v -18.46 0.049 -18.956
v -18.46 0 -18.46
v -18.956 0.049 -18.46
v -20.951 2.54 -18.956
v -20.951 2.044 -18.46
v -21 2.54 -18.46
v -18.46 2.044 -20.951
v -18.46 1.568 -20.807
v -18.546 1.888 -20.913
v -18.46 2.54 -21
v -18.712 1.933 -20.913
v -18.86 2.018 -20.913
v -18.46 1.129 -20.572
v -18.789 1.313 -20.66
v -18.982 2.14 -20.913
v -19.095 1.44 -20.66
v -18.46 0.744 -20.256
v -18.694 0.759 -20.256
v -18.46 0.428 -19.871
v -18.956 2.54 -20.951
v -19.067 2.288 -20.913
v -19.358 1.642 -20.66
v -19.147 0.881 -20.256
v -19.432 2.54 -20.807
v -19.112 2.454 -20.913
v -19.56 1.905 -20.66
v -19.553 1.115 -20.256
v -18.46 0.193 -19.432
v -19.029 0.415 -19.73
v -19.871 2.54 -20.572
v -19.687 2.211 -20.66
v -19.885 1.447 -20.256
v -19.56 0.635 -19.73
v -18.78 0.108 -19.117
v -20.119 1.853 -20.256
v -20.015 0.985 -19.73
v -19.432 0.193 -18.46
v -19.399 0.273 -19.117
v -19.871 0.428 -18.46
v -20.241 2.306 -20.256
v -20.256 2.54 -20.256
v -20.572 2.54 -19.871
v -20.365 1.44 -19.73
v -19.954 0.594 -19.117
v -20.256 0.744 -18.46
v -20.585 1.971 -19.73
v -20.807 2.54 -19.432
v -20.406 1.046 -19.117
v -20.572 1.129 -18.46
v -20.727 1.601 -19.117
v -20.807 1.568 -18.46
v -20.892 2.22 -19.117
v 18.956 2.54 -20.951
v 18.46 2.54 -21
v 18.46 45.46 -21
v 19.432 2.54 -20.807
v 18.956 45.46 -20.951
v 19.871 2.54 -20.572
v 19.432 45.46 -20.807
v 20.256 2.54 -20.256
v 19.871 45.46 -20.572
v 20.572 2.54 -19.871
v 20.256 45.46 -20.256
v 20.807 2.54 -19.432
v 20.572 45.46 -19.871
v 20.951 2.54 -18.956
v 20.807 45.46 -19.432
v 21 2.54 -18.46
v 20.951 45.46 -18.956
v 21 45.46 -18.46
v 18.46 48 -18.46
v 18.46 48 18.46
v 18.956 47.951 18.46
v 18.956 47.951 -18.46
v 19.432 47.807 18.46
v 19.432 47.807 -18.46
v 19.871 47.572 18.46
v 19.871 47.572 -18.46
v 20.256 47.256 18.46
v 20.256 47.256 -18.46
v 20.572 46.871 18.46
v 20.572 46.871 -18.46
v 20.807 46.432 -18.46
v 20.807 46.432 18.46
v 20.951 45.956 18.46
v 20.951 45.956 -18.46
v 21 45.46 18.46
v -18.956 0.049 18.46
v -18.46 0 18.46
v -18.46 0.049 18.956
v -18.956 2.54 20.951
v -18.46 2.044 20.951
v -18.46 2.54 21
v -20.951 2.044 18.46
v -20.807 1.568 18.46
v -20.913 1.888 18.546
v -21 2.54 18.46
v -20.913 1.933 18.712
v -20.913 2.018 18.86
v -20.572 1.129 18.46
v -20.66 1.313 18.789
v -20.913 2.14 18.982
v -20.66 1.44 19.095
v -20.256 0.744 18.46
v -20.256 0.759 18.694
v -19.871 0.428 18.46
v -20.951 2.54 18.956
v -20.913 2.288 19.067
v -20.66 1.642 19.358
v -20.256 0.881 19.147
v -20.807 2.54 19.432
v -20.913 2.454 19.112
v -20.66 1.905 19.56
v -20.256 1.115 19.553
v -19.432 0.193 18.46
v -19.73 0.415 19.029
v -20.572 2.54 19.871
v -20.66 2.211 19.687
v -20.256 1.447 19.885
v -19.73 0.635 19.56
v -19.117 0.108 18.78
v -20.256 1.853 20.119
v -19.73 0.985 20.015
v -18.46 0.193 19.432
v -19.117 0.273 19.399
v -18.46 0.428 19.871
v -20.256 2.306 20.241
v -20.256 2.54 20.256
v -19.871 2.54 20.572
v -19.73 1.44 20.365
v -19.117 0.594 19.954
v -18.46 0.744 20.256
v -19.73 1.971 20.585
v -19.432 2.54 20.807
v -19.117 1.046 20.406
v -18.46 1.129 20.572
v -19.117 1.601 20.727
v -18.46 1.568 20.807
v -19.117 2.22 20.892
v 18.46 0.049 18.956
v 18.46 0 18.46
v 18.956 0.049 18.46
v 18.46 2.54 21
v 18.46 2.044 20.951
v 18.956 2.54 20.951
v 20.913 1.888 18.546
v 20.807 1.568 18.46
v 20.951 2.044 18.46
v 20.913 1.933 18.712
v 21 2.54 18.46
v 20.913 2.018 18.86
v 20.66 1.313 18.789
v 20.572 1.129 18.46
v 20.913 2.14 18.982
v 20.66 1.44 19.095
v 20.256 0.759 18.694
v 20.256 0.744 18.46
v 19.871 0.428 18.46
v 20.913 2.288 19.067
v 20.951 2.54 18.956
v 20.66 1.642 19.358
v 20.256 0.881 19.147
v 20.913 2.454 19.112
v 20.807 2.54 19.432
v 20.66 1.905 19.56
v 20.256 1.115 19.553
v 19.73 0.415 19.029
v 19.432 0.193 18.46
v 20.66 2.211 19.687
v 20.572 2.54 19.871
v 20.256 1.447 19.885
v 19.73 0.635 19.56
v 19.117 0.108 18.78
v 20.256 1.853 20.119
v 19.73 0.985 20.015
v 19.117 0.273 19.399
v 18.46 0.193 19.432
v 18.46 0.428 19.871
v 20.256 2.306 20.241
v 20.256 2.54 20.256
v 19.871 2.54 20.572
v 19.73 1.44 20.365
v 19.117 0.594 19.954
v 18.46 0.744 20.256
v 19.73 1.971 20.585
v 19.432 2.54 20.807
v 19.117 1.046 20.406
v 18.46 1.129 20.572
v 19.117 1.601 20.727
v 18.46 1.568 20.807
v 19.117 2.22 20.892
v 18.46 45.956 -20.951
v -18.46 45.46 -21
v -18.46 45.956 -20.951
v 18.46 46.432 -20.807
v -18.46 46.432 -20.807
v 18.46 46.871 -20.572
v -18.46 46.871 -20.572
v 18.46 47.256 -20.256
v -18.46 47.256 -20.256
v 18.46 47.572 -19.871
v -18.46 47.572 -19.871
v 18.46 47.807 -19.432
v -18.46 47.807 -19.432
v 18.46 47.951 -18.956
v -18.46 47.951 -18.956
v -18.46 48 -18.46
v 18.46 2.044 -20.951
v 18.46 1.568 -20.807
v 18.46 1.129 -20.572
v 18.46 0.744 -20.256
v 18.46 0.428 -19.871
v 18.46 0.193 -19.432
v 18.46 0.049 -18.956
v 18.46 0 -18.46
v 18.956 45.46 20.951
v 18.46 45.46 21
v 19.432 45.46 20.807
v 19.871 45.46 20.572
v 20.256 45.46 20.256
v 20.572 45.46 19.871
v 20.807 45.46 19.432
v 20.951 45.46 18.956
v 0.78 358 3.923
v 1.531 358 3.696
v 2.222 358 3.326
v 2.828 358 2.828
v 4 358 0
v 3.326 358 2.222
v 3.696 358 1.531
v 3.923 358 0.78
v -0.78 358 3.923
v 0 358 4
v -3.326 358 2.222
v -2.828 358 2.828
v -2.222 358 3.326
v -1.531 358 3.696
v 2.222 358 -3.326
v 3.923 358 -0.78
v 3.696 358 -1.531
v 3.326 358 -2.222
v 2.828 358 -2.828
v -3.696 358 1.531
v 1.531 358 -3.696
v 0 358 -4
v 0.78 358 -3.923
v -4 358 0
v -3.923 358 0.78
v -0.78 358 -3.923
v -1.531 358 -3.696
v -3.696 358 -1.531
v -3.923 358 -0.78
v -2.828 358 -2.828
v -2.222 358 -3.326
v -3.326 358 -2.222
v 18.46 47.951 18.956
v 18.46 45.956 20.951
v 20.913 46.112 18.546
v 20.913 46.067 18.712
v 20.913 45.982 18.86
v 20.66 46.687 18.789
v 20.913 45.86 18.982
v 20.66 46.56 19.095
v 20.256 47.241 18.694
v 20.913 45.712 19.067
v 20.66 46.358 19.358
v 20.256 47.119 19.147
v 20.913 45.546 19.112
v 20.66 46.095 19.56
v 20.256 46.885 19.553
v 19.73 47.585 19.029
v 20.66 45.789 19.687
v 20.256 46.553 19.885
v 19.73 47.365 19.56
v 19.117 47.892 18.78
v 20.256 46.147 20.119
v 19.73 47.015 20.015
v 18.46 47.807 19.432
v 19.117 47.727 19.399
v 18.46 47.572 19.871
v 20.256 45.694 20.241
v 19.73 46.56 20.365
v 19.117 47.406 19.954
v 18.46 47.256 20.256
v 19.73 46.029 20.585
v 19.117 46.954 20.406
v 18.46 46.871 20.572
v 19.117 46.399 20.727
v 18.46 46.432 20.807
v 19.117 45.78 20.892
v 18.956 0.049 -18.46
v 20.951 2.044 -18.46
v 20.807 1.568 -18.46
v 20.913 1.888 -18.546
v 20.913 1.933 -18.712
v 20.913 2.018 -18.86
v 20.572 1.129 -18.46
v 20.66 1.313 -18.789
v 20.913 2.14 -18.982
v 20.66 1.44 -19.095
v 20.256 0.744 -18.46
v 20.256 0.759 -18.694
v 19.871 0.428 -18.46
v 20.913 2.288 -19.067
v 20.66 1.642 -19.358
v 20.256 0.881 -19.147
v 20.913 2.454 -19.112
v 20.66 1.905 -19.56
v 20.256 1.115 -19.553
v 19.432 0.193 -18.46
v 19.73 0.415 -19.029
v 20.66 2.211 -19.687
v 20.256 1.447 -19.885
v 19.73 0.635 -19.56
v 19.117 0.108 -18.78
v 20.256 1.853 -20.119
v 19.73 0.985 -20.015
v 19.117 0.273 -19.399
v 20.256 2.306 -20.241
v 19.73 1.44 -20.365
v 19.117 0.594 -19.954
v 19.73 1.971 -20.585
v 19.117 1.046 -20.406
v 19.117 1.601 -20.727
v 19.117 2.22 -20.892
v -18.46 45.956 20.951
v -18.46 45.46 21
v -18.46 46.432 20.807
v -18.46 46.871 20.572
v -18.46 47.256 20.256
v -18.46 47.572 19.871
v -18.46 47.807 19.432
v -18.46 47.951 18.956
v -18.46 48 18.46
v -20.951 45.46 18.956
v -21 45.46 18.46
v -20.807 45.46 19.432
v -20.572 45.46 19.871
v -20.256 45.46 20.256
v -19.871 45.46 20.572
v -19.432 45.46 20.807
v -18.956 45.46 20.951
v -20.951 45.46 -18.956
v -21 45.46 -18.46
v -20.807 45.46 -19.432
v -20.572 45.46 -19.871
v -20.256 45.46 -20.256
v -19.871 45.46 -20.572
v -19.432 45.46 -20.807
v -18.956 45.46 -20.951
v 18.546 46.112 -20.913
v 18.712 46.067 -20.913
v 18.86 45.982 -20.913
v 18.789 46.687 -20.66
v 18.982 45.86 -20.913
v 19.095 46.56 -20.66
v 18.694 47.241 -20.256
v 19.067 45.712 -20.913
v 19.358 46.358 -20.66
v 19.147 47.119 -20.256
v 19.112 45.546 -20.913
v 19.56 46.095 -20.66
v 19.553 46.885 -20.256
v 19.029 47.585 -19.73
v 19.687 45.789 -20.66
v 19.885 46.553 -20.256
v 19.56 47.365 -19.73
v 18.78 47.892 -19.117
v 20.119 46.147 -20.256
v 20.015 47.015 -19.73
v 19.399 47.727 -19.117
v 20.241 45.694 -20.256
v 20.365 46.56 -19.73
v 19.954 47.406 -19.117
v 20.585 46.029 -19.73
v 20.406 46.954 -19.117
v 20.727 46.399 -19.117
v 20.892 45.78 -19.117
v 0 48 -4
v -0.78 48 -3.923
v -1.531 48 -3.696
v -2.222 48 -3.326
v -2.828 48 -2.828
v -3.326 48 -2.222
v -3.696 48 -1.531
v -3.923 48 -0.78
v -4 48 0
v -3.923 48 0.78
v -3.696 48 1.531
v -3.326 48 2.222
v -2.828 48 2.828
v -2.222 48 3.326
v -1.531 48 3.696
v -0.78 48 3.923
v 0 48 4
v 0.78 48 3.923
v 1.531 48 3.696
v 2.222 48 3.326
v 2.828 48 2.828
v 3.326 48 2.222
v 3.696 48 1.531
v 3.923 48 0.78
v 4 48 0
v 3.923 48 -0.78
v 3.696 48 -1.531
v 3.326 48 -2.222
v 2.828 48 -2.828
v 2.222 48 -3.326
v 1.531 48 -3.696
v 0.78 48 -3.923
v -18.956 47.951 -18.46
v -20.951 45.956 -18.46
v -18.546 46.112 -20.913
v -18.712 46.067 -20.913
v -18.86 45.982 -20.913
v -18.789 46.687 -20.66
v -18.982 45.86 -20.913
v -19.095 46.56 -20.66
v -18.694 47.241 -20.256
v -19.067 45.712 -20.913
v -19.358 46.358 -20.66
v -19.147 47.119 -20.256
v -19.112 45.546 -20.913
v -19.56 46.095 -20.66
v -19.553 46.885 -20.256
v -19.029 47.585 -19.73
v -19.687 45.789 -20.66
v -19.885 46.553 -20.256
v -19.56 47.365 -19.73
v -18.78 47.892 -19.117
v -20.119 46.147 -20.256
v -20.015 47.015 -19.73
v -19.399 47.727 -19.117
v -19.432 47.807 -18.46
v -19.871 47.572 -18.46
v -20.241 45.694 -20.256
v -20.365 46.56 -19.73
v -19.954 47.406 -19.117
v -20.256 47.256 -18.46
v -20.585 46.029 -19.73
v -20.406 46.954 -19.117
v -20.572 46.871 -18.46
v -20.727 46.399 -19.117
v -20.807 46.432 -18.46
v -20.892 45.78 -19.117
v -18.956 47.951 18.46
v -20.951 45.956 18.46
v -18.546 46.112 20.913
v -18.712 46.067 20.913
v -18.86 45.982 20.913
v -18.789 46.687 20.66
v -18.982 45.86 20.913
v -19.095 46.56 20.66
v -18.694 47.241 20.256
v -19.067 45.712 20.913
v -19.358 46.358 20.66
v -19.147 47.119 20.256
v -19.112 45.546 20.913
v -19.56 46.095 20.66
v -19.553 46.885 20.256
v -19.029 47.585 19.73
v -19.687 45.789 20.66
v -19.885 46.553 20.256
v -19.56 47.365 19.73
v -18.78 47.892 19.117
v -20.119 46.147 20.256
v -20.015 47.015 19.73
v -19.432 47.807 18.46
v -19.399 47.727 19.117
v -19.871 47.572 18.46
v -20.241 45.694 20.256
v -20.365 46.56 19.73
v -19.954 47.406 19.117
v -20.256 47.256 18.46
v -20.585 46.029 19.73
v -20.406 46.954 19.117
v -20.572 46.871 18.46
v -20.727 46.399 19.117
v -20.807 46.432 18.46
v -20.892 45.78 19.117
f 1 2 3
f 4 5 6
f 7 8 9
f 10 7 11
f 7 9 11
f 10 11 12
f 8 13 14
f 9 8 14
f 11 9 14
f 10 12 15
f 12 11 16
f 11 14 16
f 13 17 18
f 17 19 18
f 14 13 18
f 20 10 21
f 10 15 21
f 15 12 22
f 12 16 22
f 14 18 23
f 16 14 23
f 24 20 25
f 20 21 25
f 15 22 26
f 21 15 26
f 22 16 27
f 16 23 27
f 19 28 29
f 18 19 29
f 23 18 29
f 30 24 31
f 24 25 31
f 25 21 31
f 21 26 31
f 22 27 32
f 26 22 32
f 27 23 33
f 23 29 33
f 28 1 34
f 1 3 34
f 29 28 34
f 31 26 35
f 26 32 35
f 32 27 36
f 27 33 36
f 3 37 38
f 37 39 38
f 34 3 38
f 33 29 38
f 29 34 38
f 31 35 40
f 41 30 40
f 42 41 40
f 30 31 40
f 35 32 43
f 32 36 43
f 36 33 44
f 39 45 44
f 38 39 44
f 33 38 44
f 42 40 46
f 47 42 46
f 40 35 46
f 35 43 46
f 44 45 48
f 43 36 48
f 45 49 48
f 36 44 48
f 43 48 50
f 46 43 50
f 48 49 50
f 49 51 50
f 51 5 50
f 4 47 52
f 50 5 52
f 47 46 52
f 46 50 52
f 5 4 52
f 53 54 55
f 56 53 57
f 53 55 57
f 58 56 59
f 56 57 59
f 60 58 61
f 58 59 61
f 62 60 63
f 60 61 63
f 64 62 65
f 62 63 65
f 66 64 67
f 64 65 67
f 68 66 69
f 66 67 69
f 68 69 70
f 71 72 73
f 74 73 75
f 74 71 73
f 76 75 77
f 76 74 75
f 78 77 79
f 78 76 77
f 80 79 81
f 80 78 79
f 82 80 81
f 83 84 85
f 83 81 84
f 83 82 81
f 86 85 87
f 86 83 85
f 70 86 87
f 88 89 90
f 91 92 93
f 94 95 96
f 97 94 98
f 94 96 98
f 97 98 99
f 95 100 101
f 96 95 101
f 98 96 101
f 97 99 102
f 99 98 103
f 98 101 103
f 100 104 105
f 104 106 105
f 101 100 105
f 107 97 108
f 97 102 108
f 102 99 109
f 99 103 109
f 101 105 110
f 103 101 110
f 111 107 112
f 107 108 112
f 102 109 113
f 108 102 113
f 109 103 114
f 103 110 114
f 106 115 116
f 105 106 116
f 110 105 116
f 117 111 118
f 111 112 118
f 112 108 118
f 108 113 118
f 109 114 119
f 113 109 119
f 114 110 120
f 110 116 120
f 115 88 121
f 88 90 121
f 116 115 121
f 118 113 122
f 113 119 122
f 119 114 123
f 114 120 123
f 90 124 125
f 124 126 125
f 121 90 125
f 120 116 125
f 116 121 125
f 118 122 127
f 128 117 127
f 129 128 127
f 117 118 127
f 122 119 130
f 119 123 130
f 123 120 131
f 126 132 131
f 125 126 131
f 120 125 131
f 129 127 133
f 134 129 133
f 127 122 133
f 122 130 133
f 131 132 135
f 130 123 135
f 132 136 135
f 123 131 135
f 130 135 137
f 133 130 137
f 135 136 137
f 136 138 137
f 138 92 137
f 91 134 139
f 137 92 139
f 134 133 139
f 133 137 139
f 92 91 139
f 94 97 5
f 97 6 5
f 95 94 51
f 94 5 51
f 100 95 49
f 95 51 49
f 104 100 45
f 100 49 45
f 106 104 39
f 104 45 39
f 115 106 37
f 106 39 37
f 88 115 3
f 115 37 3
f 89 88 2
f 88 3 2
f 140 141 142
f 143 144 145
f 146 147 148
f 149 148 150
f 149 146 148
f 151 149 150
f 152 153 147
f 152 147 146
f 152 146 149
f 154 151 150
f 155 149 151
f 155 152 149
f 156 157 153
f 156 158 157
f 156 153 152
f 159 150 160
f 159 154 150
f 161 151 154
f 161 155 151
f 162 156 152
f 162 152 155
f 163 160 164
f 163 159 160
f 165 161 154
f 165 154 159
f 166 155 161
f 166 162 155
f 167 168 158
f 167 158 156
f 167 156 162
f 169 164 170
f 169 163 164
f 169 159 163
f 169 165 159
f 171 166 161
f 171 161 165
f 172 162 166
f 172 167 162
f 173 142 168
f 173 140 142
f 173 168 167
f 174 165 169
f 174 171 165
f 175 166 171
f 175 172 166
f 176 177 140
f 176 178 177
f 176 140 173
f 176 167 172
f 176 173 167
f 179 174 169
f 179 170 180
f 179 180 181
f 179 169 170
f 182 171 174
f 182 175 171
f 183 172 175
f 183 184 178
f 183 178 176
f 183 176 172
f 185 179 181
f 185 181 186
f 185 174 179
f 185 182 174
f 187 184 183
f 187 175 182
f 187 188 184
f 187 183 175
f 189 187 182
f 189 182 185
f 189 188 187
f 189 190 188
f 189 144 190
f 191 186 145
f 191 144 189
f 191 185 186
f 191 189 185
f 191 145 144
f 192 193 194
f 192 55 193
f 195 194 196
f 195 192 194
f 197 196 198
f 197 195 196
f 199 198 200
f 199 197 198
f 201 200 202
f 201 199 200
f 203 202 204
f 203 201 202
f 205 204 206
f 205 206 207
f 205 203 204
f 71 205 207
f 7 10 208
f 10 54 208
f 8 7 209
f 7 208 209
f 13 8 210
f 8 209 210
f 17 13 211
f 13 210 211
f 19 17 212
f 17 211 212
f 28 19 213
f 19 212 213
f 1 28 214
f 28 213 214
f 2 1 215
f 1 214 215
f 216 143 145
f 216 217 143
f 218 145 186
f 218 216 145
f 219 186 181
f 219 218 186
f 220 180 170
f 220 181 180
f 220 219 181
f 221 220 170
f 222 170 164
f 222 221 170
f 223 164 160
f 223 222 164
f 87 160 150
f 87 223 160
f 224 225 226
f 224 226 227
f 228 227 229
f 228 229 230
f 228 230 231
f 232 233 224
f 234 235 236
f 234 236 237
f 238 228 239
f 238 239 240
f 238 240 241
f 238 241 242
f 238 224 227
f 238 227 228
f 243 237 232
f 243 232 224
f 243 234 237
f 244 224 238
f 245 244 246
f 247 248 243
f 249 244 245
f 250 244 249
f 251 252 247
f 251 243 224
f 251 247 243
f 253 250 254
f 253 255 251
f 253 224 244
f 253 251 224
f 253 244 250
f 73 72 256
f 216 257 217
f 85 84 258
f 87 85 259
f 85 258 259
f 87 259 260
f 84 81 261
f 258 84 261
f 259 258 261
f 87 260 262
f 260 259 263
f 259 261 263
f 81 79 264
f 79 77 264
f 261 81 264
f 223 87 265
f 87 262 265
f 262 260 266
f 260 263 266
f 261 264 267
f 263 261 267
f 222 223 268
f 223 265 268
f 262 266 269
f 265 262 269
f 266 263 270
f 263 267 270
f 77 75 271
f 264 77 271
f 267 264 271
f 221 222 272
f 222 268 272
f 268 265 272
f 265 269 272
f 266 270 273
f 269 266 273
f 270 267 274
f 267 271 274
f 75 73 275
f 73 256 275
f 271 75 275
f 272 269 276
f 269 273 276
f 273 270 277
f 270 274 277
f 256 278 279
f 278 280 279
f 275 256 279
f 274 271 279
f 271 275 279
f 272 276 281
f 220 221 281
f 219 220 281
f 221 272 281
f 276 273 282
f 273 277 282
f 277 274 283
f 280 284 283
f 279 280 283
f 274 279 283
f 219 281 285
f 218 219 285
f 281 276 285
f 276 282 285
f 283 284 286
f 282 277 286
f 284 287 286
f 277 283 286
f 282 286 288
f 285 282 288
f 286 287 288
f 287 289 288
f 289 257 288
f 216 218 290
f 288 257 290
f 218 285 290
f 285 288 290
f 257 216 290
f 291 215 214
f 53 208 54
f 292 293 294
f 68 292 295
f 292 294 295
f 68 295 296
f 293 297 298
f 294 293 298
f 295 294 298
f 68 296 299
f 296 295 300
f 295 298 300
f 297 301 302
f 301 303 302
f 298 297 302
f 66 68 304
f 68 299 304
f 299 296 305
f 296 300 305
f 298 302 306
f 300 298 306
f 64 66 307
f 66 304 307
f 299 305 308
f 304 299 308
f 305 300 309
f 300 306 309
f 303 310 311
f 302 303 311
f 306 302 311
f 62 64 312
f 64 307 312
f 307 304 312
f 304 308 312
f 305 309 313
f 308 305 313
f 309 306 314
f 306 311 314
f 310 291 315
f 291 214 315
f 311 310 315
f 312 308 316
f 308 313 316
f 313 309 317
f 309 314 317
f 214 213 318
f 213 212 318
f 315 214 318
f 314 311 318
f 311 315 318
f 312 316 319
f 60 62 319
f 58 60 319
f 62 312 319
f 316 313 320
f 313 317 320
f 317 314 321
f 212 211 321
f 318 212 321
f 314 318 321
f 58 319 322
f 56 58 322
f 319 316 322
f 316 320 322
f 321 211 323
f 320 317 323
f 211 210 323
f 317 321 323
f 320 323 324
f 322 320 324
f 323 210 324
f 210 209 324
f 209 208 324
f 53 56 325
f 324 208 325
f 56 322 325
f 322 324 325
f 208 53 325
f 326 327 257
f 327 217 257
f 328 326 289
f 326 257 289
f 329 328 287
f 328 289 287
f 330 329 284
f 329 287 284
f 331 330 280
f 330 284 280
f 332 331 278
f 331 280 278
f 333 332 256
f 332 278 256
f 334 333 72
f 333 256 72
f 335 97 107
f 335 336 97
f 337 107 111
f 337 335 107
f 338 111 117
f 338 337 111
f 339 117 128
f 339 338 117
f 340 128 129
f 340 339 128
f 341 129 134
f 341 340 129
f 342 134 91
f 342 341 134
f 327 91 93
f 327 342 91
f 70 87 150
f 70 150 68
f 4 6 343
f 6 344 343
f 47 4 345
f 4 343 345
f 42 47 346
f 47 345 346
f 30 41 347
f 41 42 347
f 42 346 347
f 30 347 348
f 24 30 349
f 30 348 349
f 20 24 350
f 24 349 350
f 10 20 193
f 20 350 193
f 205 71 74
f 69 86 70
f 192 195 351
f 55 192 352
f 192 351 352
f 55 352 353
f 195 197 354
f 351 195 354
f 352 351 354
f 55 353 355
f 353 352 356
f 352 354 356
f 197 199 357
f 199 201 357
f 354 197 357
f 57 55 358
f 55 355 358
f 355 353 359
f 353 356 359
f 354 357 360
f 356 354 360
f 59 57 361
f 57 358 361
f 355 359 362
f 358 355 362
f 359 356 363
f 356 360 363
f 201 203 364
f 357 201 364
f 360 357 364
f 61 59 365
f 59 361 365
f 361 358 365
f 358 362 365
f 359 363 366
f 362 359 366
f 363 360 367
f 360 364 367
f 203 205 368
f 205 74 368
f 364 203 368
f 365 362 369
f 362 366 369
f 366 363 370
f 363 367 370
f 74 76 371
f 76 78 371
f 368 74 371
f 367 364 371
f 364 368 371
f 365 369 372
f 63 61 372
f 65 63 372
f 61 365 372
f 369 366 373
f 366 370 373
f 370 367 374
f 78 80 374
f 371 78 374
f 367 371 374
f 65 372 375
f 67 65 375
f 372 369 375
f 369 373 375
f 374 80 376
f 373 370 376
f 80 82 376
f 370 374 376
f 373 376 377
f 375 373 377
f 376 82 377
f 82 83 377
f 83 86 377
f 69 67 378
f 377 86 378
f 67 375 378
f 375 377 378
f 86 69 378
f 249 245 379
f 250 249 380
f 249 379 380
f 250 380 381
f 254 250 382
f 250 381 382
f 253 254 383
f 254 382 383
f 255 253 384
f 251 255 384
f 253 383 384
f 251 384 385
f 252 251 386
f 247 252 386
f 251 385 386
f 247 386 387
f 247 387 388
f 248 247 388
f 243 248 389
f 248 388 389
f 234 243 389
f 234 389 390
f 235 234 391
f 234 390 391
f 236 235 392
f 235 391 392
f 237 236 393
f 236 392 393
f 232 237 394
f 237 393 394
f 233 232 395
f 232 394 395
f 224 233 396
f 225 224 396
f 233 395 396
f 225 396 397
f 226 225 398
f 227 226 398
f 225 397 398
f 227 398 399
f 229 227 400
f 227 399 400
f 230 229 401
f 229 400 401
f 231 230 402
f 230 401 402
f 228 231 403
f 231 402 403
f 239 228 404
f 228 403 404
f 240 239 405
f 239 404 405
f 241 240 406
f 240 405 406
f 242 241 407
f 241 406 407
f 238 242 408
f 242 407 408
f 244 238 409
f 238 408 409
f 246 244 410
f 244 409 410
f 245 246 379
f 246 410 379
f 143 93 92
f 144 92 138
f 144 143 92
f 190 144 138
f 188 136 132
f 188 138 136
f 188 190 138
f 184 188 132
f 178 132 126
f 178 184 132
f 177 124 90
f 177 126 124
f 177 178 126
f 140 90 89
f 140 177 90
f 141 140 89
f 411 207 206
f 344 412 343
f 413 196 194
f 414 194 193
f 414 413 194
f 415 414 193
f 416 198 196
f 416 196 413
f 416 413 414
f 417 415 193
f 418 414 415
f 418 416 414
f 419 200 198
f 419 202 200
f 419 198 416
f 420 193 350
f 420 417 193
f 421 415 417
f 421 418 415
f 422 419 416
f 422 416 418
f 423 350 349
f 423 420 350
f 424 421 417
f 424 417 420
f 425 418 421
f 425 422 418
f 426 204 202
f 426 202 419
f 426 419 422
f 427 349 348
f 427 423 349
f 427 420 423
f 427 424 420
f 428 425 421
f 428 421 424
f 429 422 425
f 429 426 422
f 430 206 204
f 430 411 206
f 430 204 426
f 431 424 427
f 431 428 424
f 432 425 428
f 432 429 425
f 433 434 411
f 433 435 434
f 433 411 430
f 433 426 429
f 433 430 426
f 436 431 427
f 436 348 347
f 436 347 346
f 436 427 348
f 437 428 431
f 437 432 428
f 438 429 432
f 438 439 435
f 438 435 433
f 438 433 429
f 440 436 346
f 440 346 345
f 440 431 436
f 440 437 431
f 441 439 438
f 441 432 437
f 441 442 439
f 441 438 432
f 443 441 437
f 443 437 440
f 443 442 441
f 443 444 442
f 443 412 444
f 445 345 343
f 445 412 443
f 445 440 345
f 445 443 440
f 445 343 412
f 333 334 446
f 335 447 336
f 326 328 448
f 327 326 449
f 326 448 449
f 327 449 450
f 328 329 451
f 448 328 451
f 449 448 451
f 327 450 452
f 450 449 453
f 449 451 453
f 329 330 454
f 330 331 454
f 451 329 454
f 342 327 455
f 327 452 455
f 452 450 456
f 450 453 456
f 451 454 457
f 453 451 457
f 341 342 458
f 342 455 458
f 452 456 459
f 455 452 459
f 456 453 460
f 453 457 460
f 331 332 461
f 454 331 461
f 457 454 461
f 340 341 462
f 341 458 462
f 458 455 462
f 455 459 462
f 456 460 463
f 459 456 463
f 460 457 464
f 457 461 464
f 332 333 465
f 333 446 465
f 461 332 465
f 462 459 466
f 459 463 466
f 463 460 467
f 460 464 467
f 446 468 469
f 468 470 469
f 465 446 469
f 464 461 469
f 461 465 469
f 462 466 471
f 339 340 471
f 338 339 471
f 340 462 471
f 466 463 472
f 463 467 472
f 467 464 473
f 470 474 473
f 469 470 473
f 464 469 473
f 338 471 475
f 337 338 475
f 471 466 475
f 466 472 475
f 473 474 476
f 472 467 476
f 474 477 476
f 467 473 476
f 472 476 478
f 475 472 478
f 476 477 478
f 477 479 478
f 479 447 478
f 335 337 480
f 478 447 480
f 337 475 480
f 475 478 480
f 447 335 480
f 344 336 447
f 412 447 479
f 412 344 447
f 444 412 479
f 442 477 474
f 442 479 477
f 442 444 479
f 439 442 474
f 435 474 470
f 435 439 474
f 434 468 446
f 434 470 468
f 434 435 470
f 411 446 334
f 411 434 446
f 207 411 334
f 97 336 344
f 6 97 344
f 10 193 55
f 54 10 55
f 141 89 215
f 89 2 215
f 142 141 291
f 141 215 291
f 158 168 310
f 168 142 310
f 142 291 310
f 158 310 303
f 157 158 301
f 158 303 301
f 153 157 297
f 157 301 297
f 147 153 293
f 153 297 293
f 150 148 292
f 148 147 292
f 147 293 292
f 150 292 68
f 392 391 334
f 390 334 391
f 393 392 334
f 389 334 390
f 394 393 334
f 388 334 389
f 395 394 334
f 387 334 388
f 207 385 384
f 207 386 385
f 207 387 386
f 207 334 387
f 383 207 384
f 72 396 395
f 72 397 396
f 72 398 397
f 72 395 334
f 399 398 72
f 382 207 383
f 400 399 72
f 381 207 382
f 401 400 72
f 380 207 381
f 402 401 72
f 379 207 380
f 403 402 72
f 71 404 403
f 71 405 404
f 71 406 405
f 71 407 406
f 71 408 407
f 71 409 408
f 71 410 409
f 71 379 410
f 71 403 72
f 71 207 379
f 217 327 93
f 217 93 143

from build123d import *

# Parameters (mm, degrees)
SKETCH1_W           = 42
SKETCH1_H           = 42
BOSS_EXTRUDE1_DEPTH = 48
SKETCH2_R           = 4
BOSS_EXTRUDE2_DEPTH = 310
FILLET1_R           = 2.54


with BuildPart() as part:
    # Sketch1 → Boss-Extrude1 (new body)
    with BuildSketch(Plane(origin=(0, 0, 0), x_dir=(1, 0, 0), z_dir=(0, 1, 0))):
        Rectangle(SKETCH1_W, SKETCH1_H)
    extrude(amount=BOSS_EXTRUDE1_DEPTH)

    # Sketch2 → Boss-Extrude2 (add)
    with BuildSketch(Plane(origin=(0, 48, 0), x_dir=(1, 0, 0), z_dir=(0, 1, 0))):
        with Locations(Location((0, 0, 0), (0, 0, 90))):
            Circle(SKETCH2_R)
    extrude(amount=BOSS_EXTRUDE2_DEPTH)

    # Fillet1
    fillet1_edges = [part.edges().sort_by_distance(p)[0] for p in [
        (-21, 48, 0),
        (0, 48, 21),
        (21, 48, 0),
        (0, 0, 21),
        (-21, 0, 0),
        (0, 0, -21),
        (21, 0, 0),
        (0, 48, -21),
        (21, 24, 21),
        (-21, 24, 21),
        (-21, 24, -21),
        (21, 24, -21),
    ]]
    fillet(fillet1_edges, radius=FILLET1_R)


solid = part.part
